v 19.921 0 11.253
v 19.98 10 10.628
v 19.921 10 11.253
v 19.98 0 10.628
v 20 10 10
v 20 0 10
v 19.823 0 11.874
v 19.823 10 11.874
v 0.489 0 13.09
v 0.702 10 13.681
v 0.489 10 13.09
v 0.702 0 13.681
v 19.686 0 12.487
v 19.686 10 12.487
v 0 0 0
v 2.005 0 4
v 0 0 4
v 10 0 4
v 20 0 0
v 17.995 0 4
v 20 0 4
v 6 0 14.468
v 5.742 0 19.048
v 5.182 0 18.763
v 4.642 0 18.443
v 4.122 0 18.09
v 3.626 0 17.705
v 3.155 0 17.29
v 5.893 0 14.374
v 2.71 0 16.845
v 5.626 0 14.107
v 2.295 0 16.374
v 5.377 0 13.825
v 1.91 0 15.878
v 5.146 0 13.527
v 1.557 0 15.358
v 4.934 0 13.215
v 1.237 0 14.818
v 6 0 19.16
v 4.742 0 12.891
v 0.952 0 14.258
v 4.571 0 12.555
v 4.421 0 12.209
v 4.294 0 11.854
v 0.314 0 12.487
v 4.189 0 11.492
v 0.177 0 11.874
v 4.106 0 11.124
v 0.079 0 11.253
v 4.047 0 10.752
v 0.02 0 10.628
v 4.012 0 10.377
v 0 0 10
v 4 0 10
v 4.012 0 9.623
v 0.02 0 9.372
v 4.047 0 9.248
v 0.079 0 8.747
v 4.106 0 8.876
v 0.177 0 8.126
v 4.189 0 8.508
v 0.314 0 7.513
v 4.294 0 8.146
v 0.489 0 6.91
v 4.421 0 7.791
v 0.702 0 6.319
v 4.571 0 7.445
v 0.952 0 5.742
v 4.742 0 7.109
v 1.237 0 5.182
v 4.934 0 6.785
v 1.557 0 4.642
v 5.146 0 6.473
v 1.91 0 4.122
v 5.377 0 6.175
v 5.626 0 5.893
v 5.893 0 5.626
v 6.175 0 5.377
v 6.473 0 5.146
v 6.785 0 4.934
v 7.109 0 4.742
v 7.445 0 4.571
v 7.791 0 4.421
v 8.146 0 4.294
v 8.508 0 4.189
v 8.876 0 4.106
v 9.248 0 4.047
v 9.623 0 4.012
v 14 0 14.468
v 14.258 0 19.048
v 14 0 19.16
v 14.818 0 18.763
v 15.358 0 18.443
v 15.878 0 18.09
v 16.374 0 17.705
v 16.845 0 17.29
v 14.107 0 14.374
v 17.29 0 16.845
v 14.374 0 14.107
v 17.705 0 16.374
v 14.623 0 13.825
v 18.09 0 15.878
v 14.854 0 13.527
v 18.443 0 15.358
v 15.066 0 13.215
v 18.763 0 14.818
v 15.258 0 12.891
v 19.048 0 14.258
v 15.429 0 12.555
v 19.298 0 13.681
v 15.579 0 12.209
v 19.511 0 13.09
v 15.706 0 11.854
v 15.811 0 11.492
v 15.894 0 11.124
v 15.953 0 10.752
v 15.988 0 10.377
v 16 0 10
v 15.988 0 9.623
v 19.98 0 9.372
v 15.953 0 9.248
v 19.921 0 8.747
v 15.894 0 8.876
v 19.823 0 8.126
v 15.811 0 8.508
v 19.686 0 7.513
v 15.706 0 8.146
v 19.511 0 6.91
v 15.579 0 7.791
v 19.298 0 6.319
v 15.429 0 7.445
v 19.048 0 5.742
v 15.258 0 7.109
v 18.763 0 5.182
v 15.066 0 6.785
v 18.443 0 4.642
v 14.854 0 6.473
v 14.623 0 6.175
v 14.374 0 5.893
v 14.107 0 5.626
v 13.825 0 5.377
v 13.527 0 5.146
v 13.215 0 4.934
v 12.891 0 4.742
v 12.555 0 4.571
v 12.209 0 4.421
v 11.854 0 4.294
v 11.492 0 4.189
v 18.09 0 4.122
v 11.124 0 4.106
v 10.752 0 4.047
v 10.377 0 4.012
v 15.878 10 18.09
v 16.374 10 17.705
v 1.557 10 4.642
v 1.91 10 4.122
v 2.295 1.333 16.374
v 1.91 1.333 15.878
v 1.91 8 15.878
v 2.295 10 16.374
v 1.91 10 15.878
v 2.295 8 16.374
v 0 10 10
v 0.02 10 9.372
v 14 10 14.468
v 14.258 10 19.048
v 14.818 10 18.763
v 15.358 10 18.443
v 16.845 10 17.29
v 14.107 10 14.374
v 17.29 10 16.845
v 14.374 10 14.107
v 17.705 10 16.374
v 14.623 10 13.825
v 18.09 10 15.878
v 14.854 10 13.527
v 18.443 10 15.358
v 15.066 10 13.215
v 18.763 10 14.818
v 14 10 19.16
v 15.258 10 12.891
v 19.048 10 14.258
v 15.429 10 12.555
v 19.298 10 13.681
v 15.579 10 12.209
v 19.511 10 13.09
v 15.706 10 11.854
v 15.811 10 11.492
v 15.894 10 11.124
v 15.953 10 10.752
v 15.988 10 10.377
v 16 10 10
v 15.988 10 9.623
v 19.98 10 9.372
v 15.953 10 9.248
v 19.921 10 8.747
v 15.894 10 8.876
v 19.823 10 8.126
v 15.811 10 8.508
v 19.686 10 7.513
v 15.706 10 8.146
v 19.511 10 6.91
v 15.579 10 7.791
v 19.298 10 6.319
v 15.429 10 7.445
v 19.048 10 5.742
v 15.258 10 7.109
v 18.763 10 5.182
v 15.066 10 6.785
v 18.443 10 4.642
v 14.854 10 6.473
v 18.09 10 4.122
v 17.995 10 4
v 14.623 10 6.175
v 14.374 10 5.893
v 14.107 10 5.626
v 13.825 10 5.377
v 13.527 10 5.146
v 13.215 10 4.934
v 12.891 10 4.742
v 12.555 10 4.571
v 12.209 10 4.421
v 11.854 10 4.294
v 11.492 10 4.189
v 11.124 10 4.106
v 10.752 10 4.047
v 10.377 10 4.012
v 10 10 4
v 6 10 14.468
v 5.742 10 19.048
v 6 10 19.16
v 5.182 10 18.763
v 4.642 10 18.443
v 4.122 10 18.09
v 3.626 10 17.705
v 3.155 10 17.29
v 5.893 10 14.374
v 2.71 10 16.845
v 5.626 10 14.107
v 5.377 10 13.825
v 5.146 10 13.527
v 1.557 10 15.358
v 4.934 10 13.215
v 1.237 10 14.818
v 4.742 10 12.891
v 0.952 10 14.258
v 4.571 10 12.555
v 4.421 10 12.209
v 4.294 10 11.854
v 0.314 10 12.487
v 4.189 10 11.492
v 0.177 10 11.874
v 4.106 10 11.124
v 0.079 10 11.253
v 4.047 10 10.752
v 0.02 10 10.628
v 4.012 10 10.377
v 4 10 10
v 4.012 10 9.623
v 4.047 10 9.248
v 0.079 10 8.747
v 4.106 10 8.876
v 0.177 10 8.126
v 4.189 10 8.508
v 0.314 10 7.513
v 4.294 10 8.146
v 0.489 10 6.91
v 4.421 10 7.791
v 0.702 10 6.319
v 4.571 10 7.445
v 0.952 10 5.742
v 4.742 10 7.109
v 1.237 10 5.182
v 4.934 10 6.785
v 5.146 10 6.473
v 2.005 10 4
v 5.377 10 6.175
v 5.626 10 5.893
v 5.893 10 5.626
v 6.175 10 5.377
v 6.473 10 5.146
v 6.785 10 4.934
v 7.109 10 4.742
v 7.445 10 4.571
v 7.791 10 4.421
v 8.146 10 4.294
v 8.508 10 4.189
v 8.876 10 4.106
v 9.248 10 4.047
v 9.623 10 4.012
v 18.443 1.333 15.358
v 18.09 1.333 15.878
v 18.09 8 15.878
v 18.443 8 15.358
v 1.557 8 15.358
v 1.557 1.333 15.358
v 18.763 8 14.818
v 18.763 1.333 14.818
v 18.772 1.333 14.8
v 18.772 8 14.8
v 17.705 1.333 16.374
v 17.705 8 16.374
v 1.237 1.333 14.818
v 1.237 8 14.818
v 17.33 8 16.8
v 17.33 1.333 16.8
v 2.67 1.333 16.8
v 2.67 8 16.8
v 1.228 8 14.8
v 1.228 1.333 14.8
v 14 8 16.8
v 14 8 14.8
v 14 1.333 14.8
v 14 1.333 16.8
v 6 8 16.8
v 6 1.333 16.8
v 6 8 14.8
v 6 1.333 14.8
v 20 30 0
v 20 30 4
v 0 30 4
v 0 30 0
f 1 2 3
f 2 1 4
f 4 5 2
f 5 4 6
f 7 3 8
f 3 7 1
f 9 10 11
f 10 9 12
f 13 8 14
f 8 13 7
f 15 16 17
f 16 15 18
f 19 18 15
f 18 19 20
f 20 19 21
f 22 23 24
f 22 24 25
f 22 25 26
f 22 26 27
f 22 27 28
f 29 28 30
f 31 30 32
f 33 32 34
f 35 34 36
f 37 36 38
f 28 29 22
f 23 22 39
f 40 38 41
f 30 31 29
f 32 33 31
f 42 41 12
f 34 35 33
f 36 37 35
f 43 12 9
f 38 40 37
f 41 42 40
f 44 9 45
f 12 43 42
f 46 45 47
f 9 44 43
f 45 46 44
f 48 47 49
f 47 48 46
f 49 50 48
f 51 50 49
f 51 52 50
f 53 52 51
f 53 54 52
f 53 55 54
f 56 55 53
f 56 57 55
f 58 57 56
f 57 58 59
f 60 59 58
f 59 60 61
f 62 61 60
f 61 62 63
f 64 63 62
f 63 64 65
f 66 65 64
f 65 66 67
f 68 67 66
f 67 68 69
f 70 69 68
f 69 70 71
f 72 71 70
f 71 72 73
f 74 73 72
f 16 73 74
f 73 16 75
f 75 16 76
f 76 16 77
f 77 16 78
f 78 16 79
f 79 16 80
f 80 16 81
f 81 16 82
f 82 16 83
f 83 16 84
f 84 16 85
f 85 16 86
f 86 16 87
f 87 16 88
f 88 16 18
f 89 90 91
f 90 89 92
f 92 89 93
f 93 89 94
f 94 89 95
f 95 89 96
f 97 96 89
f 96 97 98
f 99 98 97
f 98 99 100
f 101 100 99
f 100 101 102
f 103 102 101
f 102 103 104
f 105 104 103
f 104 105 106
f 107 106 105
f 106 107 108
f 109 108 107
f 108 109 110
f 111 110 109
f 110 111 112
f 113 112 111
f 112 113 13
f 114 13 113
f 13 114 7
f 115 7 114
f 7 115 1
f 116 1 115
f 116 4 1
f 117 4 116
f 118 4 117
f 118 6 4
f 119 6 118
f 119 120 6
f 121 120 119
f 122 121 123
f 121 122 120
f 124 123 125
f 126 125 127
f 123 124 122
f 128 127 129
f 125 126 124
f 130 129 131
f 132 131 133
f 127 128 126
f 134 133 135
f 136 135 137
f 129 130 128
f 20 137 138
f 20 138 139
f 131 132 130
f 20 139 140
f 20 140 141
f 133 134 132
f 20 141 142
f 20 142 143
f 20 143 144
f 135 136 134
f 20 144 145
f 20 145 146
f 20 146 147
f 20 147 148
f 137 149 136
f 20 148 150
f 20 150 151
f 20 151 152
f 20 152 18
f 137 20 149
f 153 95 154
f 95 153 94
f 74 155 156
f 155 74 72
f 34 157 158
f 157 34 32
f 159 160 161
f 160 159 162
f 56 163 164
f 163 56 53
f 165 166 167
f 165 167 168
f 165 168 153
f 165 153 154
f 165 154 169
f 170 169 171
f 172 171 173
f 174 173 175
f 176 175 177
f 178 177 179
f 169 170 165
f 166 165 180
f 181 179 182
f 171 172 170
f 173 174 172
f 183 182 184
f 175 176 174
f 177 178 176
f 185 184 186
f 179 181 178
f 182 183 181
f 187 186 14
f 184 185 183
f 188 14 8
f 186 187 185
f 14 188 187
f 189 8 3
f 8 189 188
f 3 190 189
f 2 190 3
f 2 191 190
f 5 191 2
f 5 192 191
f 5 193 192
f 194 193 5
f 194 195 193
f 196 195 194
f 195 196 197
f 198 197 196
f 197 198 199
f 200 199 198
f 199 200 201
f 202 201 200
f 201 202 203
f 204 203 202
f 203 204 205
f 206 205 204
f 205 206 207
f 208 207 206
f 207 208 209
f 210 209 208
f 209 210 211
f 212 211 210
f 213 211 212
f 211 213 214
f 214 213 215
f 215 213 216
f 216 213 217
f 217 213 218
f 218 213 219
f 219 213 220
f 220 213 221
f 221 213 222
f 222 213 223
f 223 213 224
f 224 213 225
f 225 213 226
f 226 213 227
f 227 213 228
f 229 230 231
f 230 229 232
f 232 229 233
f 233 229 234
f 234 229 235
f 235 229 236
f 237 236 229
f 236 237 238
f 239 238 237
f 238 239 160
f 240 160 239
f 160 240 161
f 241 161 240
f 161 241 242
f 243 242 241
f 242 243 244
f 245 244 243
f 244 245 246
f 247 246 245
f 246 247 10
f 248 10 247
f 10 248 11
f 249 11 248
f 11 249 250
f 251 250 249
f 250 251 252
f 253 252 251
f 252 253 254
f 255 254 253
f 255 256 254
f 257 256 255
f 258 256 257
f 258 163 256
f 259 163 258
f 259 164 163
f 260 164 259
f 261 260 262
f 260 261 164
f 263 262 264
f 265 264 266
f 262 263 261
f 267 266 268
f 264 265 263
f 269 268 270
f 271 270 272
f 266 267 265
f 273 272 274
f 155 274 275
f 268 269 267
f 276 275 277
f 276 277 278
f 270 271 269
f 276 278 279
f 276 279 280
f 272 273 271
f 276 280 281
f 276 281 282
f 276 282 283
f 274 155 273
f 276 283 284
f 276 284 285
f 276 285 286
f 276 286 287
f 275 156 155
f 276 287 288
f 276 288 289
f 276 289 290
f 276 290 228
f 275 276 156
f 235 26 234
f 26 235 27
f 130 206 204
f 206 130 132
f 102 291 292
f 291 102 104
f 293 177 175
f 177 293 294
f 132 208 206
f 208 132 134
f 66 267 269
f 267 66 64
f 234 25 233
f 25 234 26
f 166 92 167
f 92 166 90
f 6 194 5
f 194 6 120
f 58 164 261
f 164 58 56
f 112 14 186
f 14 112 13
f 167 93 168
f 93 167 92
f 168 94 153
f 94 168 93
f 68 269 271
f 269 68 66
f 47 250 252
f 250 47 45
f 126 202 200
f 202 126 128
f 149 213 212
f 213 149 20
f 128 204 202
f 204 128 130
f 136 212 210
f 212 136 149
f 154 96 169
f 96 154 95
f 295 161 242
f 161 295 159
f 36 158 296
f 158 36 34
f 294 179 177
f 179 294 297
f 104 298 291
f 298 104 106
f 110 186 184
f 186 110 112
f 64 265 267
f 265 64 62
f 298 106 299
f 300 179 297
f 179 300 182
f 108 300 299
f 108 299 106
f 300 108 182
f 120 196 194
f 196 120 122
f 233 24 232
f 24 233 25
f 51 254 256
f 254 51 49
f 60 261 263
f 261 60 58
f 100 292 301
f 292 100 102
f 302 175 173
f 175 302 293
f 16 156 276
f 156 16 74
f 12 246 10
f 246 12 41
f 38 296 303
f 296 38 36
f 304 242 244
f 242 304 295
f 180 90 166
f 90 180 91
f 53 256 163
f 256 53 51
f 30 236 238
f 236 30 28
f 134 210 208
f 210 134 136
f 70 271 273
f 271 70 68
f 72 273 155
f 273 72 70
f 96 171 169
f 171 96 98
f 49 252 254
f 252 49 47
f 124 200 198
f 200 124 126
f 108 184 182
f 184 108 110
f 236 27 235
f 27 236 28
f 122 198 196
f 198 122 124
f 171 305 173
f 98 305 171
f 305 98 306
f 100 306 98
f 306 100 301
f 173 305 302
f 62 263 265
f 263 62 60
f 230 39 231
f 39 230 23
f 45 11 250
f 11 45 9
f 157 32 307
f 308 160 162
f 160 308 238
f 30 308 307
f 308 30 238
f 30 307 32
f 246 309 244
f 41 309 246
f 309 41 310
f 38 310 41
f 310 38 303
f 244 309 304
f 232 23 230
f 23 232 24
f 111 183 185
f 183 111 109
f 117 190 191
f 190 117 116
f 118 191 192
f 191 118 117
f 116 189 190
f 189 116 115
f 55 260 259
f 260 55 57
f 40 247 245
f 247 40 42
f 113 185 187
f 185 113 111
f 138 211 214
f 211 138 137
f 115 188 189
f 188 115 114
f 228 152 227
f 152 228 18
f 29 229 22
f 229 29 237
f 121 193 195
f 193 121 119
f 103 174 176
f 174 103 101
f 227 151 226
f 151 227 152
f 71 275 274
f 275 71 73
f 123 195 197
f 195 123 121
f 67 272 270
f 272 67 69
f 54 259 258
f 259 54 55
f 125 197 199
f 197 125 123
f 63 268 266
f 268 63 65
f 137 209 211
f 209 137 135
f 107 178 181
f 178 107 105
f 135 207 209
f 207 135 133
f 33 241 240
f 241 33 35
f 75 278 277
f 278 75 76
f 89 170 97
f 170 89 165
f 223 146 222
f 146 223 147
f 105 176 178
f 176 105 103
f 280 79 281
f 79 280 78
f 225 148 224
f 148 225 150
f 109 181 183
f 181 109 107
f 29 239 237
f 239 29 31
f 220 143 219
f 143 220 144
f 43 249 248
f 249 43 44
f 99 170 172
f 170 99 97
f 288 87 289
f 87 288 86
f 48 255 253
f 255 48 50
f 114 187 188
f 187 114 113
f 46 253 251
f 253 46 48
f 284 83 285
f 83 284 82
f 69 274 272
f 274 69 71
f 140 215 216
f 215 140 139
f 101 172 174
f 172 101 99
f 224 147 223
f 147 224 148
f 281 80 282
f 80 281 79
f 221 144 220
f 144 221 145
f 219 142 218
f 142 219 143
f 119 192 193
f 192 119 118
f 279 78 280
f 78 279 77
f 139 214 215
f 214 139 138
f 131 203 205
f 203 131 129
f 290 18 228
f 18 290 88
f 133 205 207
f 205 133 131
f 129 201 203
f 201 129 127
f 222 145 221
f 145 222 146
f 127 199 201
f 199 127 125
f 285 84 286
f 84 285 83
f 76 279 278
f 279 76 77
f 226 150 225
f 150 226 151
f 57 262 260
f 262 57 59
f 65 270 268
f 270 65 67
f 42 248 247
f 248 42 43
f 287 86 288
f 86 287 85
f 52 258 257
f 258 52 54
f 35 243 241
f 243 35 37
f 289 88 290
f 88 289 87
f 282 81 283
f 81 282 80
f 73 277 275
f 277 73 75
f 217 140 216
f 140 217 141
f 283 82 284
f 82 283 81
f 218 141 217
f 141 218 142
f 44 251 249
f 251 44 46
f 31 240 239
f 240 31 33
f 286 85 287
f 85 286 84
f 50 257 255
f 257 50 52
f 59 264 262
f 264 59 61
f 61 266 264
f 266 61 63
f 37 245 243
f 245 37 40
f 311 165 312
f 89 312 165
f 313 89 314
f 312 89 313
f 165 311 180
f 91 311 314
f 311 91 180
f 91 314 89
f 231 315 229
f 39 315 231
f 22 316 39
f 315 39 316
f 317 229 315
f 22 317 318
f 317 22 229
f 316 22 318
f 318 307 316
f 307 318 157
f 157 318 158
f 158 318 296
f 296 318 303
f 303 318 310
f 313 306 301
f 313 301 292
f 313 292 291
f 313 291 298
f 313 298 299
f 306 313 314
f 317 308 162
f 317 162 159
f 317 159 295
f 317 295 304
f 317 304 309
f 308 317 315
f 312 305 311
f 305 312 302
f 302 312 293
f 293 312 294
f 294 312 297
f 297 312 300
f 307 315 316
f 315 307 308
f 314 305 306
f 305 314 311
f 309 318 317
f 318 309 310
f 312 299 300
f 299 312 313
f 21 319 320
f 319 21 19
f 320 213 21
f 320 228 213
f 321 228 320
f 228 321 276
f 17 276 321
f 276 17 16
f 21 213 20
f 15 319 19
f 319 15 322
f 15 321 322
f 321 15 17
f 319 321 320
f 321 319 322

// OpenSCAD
 /*
 * Radiator cable holder
 * (c) 2020 David Mikulik
 * Licensed under 
 *   Creative Commons 
 *   Attribution Non Comercial Share alike license
 */
 
THIKNES= 4;
WIDTH=20;
HEIGTH=30;

DIAMETER=20;

cube([WIDTH,HEIGTH,THIKNES]);
translate ([WIDTH/2,WIDTH/2,DIAMETER-THIKNES*2.5]) {
    rotate([90,0,0]) {
        difference () {
            cylinder(d=DIAMETER,h=WIDTH/2, $fn=100);
            cylinder(d=DIAMETER-THIKNES*2,h=WIDTH/2, $fn=100);
        translate ([-THIKNES,0,0]) 
            cube([THIKNES*2,WIDTH,WIDTH]);
        translate ([-WIDTH/2,THIKNES*1.2,WIDTH/10]) 
            cube([WIDTH,THIKNES/2,WIDTH/3]);
        }

    }
}
